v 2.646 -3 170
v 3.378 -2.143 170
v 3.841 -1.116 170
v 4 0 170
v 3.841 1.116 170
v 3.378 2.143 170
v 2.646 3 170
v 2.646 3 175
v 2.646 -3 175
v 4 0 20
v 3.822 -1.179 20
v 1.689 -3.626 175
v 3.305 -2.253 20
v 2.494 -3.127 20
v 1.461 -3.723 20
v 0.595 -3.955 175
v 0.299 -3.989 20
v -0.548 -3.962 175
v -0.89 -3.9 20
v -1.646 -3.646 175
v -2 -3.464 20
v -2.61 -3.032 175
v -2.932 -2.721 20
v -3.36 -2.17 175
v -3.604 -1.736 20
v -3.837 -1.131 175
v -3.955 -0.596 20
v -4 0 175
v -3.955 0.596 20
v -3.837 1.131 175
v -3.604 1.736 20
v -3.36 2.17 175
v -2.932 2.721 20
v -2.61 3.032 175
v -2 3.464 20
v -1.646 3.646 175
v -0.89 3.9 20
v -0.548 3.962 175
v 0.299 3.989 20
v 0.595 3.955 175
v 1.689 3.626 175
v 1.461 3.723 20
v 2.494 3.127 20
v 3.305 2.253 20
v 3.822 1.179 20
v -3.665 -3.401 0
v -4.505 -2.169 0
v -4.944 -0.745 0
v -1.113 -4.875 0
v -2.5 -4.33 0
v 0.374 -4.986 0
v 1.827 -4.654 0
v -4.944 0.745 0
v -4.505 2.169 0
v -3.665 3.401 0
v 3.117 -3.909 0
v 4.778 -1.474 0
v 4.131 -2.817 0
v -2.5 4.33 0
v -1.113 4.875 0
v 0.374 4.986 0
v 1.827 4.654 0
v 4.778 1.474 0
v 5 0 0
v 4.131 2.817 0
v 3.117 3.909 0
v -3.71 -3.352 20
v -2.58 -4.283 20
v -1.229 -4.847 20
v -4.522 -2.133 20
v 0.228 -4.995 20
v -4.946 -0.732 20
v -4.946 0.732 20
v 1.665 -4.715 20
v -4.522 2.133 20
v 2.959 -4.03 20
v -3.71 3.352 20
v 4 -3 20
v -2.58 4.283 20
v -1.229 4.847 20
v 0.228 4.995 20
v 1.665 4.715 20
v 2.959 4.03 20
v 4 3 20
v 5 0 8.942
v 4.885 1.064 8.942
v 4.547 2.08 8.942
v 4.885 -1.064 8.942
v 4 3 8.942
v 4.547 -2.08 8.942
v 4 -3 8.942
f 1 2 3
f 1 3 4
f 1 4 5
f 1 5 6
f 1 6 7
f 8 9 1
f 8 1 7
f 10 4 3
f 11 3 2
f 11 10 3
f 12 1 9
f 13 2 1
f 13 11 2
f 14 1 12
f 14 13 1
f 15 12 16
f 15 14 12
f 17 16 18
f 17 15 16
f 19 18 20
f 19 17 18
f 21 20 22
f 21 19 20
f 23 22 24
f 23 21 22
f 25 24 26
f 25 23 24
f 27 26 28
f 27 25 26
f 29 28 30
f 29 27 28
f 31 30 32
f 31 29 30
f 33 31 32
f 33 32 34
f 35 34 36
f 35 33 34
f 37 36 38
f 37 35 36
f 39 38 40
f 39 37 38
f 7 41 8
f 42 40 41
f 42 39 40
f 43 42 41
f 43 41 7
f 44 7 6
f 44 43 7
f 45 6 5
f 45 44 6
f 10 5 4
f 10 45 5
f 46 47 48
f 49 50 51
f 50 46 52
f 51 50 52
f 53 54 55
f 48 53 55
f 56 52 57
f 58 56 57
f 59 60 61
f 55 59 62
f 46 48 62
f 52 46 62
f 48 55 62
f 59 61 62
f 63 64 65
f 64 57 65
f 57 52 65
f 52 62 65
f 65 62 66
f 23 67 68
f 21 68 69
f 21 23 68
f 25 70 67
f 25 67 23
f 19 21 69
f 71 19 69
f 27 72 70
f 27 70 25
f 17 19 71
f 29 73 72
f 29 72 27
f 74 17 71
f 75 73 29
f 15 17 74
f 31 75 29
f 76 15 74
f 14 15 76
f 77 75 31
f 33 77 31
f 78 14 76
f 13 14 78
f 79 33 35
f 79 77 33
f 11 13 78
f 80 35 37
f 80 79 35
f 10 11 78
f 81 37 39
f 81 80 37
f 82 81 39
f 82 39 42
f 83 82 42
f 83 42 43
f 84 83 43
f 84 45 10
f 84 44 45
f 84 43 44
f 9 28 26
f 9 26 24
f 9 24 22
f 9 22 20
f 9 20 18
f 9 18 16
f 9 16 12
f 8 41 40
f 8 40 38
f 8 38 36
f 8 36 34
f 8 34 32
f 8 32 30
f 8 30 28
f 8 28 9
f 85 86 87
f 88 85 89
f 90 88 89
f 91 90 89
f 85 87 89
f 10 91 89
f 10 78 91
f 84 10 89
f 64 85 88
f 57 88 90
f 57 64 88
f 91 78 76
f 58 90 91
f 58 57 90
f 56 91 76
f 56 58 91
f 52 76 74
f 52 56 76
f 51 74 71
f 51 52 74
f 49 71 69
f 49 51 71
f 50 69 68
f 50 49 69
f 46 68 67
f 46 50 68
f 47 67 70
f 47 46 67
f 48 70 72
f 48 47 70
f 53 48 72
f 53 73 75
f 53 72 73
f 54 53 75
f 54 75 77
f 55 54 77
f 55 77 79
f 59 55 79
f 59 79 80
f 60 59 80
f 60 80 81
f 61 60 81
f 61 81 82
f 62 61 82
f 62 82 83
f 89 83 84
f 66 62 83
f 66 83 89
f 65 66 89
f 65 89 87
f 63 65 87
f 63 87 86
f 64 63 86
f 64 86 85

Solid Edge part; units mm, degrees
sketch "Sketch1" plane through (0, 0, 0) normal (0, 0, 1) x (1, 0, 0)
  circle A0 centre (0, 0) radius 5
extrude "Protrusion1" add sketch "Sketch1" along normal blind 20
sketch "Sketch2" plane through (0, 0, 20) normal (0, 0, 1) x (1, 0, 0)
  circle A0 centre (0, 0) radius 4
extrude "ExtrudedProtrusion_2" add sketch "Sketch2" along normal blind 155
sketch "Sketch3" plane through (0, 0, 20) normal (0, 0, 1) x (0, -1, 0)
  line L0 (-3.8216, 6.2347) -> (3.8216, 6.2347)
  line L1 (3.8216, 6.2347) -> (3.8216, 4)
  line L2 (3.8216, 4) -> (0, 4)
  line L3 (0, 4) -> (-3.8216, 4)
  line L4 (-3.8216, 4) -> (-3.8216, 6.2347)
extrude "ExtrudedCutout_1" cut sketch "Sketch3" against normal blind 11.0575
sketch "Sketch4" plane through (0, 0, 175) normal (0, 0, 1) x (0, -1, 0)
  line L0 (-3.2306, 4) -> (4.2507, 4)
  line L1 (4.2507, 4) -> (4.2507, 2.6458)
  line L2 (4.2507, 2.6458) -> (0, 2.6458)
  line L3 (0, 2.6458) -> (-3.2306, 2.6458)
  line L4 (-3.2306, 2.6458) -> (-3.2306, 4)
extrude "ExtrudedCutout_2" cut sketch "Sketch4" against normal blind 5
